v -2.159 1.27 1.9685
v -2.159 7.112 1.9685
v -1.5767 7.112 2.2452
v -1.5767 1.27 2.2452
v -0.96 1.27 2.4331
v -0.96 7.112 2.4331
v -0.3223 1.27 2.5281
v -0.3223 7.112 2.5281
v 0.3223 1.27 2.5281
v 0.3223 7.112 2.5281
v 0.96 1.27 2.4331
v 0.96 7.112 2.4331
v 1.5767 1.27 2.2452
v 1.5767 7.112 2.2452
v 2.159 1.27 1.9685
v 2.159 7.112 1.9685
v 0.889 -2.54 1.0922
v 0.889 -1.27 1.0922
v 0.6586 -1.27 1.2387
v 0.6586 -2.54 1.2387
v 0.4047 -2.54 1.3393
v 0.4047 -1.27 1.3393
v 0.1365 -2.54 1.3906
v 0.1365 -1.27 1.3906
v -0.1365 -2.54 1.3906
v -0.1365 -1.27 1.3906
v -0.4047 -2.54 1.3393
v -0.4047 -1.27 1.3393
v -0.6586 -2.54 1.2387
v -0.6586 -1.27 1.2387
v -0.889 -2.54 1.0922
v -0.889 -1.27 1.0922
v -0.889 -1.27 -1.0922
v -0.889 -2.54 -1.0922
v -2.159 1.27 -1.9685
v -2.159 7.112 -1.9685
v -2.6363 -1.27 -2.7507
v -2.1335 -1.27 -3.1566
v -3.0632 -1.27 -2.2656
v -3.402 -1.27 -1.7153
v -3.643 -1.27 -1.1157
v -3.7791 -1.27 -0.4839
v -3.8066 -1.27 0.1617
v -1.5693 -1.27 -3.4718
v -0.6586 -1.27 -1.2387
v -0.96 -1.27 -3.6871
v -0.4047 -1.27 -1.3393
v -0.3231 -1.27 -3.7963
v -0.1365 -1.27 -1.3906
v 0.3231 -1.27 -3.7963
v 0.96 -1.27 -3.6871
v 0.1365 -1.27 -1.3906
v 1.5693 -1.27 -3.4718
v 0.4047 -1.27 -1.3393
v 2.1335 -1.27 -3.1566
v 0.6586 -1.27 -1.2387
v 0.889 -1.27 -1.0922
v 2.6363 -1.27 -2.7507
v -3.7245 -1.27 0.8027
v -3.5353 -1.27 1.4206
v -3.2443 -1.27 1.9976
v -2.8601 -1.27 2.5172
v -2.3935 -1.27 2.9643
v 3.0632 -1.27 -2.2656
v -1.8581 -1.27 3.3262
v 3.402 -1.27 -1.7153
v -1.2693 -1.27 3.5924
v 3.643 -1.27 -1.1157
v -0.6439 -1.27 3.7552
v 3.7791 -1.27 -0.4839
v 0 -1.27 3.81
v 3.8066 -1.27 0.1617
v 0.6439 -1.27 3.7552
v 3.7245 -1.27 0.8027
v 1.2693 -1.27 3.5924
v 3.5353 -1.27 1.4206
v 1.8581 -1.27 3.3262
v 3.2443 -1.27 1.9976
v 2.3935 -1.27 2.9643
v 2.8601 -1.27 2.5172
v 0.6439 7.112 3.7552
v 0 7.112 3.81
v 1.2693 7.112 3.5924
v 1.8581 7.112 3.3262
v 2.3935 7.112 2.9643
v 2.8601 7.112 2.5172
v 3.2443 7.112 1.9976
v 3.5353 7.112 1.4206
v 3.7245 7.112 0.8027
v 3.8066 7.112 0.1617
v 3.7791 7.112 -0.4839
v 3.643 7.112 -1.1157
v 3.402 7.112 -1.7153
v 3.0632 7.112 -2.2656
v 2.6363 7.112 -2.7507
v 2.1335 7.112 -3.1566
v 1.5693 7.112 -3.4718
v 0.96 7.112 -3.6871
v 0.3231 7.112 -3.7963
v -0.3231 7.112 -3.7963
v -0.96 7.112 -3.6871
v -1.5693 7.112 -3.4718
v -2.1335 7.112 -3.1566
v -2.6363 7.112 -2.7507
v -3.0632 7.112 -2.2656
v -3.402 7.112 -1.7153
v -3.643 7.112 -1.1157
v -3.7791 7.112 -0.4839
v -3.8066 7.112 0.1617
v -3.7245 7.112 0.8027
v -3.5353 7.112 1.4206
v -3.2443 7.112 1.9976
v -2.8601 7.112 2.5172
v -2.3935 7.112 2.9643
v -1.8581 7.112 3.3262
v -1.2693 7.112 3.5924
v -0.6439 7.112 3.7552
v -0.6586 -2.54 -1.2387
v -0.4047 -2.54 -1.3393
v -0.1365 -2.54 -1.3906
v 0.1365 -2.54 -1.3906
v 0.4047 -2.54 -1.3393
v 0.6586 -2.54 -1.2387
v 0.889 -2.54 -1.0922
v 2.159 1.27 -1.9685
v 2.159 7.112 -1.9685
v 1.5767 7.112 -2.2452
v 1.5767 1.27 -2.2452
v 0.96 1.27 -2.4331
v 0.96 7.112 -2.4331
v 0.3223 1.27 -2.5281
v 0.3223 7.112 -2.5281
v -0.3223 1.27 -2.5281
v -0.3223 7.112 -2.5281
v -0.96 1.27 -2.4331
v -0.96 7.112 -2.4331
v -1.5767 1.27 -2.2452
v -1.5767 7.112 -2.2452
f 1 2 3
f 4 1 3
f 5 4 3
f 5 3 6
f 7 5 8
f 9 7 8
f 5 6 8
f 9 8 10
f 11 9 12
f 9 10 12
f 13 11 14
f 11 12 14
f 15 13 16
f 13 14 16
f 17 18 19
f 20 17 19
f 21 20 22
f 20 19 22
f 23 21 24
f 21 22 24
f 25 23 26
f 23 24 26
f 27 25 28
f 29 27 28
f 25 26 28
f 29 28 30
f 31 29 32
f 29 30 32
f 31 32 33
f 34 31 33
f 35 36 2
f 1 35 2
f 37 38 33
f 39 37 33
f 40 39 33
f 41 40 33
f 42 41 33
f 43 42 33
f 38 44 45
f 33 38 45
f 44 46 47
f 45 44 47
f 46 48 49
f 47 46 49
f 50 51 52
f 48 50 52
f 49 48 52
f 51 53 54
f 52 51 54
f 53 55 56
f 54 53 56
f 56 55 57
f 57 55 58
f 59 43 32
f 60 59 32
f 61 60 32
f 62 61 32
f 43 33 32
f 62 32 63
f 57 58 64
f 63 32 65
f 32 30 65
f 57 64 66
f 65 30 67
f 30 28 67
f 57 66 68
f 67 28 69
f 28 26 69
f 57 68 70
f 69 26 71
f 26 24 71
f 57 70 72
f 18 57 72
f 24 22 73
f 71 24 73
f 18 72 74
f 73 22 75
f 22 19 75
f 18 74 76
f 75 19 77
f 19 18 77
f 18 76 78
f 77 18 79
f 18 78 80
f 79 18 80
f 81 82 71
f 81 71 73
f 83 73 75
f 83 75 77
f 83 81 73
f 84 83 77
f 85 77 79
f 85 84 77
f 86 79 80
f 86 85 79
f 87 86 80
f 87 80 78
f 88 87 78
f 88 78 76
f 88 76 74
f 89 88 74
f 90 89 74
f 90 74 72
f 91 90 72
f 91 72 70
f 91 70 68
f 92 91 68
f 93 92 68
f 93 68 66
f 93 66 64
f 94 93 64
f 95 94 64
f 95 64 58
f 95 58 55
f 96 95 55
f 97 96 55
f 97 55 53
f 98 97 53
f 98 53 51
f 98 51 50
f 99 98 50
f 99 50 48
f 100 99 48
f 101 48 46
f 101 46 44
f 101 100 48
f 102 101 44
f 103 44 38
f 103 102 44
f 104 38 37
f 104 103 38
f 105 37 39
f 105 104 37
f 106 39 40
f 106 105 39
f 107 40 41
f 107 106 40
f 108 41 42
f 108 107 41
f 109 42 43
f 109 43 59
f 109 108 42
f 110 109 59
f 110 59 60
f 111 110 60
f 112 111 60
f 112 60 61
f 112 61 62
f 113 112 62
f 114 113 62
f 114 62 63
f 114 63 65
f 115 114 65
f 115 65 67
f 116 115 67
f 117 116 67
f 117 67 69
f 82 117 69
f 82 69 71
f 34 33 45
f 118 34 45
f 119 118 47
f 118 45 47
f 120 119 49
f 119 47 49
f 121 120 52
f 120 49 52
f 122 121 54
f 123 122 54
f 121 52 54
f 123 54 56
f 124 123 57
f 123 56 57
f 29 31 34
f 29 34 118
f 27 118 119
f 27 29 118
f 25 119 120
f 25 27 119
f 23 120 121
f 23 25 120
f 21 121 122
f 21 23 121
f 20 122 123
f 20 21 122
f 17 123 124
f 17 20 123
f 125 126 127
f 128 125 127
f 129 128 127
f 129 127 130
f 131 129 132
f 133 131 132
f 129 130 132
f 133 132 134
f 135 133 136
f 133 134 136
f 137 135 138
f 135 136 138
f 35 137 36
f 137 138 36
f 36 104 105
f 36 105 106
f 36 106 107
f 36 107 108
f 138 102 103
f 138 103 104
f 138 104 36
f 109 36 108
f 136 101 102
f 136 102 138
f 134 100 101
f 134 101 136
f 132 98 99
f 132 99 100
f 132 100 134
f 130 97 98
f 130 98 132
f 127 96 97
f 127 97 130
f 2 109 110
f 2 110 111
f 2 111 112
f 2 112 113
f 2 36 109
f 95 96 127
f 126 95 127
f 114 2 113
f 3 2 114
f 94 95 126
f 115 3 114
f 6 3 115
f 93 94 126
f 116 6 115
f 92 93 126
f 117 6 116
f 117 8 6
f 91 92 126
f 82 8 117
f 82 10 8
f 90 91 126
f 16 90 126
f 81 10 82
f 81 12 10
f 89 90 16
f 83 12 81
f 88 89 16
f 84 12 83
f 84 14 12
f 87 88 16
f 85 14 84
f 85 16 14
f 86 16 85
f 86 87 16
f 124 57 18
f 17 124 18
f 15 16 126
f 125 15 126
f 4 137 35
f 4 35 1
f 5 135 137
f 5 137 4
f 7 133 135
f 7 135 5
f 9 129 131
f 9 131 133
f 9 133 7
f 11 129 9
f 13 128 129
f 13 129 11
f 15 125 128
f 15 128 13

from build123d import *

# Parameters (mm, degrees)
SKETCH2_R           = 3.81
BOSS_EXTRUDE1_DEPTH = 1.27
BOSS_EXTRUDE2_DEPTH = 1.27
BOSS_EXTRUDE3_START = 5.842
SKETCH4_R           = 3.81
BOSS_EXTRUDE3_DEPTH = 5.842


with BuildPart() as part:
    # Sketch2 → Boss-Extrude1 (new, symmetric)
    with BuildSketch(Plane(origin=(0, 0, 0), x_dir=(1, 0, 0), z_dir=(0, 1, 0))):
        with Locations(Location((0, 0, 0), (0, 0, 270))):
            Circle(SKETCH2_R)
    extrude(amount=BOSS_EXTRUDE1_DEPTH, both=True)

    # Sketch3 → Boss-Extrude2 (add)
    with BuildSketch(Plane.XZ.offset(1.27)):
        with BuildLine():
            Line((-0.889, 1.0922), (-0.889, -1.0922))
            ThreePointArc((-0.889, -1.0922), (0, -1.397), (0.889, -1.0922))
            Line((0.889, -1.0922), (0.889, 1.0922))
            ThreePointArc((0.889, 1.0922), (0, 1.397), (-0.889, 1.0922))
        make_face()
    extrude(amount=BOSS_EXTRUDE2_DEPTH)

    # Sketch4 → Boss-Extrude3 (add)
    with BuildSketch(Plane(origin=(0, 1.27, 0), x_dir=(1, 0, 0), z_dir=(0, 1, 0)).offset(BOSS_EXTRUDE3_START)):
        with Locations(Location((0, 0, 0), (0, 0, 270))):
            Circle(SKETCH4_R)
        with BuildLine():
            Line((-2.159, 1.9685), (-2.159, -1.9685))
            ThreePointArc((-2.159, -1.9685), (0, -2.54), (2.159, -1.9685))
            Line((2.159, -1.9685), (2.159, 1.9685))
            ThreePointArc((2.159, 1.9685), (0, 2.54), (-2.159, 1.9685))
        make_face(mode=Mode.SUBTRACT)
    extrude(amount=-BOSS_EXTRUDE3_DEPTH)


solid = part.part
